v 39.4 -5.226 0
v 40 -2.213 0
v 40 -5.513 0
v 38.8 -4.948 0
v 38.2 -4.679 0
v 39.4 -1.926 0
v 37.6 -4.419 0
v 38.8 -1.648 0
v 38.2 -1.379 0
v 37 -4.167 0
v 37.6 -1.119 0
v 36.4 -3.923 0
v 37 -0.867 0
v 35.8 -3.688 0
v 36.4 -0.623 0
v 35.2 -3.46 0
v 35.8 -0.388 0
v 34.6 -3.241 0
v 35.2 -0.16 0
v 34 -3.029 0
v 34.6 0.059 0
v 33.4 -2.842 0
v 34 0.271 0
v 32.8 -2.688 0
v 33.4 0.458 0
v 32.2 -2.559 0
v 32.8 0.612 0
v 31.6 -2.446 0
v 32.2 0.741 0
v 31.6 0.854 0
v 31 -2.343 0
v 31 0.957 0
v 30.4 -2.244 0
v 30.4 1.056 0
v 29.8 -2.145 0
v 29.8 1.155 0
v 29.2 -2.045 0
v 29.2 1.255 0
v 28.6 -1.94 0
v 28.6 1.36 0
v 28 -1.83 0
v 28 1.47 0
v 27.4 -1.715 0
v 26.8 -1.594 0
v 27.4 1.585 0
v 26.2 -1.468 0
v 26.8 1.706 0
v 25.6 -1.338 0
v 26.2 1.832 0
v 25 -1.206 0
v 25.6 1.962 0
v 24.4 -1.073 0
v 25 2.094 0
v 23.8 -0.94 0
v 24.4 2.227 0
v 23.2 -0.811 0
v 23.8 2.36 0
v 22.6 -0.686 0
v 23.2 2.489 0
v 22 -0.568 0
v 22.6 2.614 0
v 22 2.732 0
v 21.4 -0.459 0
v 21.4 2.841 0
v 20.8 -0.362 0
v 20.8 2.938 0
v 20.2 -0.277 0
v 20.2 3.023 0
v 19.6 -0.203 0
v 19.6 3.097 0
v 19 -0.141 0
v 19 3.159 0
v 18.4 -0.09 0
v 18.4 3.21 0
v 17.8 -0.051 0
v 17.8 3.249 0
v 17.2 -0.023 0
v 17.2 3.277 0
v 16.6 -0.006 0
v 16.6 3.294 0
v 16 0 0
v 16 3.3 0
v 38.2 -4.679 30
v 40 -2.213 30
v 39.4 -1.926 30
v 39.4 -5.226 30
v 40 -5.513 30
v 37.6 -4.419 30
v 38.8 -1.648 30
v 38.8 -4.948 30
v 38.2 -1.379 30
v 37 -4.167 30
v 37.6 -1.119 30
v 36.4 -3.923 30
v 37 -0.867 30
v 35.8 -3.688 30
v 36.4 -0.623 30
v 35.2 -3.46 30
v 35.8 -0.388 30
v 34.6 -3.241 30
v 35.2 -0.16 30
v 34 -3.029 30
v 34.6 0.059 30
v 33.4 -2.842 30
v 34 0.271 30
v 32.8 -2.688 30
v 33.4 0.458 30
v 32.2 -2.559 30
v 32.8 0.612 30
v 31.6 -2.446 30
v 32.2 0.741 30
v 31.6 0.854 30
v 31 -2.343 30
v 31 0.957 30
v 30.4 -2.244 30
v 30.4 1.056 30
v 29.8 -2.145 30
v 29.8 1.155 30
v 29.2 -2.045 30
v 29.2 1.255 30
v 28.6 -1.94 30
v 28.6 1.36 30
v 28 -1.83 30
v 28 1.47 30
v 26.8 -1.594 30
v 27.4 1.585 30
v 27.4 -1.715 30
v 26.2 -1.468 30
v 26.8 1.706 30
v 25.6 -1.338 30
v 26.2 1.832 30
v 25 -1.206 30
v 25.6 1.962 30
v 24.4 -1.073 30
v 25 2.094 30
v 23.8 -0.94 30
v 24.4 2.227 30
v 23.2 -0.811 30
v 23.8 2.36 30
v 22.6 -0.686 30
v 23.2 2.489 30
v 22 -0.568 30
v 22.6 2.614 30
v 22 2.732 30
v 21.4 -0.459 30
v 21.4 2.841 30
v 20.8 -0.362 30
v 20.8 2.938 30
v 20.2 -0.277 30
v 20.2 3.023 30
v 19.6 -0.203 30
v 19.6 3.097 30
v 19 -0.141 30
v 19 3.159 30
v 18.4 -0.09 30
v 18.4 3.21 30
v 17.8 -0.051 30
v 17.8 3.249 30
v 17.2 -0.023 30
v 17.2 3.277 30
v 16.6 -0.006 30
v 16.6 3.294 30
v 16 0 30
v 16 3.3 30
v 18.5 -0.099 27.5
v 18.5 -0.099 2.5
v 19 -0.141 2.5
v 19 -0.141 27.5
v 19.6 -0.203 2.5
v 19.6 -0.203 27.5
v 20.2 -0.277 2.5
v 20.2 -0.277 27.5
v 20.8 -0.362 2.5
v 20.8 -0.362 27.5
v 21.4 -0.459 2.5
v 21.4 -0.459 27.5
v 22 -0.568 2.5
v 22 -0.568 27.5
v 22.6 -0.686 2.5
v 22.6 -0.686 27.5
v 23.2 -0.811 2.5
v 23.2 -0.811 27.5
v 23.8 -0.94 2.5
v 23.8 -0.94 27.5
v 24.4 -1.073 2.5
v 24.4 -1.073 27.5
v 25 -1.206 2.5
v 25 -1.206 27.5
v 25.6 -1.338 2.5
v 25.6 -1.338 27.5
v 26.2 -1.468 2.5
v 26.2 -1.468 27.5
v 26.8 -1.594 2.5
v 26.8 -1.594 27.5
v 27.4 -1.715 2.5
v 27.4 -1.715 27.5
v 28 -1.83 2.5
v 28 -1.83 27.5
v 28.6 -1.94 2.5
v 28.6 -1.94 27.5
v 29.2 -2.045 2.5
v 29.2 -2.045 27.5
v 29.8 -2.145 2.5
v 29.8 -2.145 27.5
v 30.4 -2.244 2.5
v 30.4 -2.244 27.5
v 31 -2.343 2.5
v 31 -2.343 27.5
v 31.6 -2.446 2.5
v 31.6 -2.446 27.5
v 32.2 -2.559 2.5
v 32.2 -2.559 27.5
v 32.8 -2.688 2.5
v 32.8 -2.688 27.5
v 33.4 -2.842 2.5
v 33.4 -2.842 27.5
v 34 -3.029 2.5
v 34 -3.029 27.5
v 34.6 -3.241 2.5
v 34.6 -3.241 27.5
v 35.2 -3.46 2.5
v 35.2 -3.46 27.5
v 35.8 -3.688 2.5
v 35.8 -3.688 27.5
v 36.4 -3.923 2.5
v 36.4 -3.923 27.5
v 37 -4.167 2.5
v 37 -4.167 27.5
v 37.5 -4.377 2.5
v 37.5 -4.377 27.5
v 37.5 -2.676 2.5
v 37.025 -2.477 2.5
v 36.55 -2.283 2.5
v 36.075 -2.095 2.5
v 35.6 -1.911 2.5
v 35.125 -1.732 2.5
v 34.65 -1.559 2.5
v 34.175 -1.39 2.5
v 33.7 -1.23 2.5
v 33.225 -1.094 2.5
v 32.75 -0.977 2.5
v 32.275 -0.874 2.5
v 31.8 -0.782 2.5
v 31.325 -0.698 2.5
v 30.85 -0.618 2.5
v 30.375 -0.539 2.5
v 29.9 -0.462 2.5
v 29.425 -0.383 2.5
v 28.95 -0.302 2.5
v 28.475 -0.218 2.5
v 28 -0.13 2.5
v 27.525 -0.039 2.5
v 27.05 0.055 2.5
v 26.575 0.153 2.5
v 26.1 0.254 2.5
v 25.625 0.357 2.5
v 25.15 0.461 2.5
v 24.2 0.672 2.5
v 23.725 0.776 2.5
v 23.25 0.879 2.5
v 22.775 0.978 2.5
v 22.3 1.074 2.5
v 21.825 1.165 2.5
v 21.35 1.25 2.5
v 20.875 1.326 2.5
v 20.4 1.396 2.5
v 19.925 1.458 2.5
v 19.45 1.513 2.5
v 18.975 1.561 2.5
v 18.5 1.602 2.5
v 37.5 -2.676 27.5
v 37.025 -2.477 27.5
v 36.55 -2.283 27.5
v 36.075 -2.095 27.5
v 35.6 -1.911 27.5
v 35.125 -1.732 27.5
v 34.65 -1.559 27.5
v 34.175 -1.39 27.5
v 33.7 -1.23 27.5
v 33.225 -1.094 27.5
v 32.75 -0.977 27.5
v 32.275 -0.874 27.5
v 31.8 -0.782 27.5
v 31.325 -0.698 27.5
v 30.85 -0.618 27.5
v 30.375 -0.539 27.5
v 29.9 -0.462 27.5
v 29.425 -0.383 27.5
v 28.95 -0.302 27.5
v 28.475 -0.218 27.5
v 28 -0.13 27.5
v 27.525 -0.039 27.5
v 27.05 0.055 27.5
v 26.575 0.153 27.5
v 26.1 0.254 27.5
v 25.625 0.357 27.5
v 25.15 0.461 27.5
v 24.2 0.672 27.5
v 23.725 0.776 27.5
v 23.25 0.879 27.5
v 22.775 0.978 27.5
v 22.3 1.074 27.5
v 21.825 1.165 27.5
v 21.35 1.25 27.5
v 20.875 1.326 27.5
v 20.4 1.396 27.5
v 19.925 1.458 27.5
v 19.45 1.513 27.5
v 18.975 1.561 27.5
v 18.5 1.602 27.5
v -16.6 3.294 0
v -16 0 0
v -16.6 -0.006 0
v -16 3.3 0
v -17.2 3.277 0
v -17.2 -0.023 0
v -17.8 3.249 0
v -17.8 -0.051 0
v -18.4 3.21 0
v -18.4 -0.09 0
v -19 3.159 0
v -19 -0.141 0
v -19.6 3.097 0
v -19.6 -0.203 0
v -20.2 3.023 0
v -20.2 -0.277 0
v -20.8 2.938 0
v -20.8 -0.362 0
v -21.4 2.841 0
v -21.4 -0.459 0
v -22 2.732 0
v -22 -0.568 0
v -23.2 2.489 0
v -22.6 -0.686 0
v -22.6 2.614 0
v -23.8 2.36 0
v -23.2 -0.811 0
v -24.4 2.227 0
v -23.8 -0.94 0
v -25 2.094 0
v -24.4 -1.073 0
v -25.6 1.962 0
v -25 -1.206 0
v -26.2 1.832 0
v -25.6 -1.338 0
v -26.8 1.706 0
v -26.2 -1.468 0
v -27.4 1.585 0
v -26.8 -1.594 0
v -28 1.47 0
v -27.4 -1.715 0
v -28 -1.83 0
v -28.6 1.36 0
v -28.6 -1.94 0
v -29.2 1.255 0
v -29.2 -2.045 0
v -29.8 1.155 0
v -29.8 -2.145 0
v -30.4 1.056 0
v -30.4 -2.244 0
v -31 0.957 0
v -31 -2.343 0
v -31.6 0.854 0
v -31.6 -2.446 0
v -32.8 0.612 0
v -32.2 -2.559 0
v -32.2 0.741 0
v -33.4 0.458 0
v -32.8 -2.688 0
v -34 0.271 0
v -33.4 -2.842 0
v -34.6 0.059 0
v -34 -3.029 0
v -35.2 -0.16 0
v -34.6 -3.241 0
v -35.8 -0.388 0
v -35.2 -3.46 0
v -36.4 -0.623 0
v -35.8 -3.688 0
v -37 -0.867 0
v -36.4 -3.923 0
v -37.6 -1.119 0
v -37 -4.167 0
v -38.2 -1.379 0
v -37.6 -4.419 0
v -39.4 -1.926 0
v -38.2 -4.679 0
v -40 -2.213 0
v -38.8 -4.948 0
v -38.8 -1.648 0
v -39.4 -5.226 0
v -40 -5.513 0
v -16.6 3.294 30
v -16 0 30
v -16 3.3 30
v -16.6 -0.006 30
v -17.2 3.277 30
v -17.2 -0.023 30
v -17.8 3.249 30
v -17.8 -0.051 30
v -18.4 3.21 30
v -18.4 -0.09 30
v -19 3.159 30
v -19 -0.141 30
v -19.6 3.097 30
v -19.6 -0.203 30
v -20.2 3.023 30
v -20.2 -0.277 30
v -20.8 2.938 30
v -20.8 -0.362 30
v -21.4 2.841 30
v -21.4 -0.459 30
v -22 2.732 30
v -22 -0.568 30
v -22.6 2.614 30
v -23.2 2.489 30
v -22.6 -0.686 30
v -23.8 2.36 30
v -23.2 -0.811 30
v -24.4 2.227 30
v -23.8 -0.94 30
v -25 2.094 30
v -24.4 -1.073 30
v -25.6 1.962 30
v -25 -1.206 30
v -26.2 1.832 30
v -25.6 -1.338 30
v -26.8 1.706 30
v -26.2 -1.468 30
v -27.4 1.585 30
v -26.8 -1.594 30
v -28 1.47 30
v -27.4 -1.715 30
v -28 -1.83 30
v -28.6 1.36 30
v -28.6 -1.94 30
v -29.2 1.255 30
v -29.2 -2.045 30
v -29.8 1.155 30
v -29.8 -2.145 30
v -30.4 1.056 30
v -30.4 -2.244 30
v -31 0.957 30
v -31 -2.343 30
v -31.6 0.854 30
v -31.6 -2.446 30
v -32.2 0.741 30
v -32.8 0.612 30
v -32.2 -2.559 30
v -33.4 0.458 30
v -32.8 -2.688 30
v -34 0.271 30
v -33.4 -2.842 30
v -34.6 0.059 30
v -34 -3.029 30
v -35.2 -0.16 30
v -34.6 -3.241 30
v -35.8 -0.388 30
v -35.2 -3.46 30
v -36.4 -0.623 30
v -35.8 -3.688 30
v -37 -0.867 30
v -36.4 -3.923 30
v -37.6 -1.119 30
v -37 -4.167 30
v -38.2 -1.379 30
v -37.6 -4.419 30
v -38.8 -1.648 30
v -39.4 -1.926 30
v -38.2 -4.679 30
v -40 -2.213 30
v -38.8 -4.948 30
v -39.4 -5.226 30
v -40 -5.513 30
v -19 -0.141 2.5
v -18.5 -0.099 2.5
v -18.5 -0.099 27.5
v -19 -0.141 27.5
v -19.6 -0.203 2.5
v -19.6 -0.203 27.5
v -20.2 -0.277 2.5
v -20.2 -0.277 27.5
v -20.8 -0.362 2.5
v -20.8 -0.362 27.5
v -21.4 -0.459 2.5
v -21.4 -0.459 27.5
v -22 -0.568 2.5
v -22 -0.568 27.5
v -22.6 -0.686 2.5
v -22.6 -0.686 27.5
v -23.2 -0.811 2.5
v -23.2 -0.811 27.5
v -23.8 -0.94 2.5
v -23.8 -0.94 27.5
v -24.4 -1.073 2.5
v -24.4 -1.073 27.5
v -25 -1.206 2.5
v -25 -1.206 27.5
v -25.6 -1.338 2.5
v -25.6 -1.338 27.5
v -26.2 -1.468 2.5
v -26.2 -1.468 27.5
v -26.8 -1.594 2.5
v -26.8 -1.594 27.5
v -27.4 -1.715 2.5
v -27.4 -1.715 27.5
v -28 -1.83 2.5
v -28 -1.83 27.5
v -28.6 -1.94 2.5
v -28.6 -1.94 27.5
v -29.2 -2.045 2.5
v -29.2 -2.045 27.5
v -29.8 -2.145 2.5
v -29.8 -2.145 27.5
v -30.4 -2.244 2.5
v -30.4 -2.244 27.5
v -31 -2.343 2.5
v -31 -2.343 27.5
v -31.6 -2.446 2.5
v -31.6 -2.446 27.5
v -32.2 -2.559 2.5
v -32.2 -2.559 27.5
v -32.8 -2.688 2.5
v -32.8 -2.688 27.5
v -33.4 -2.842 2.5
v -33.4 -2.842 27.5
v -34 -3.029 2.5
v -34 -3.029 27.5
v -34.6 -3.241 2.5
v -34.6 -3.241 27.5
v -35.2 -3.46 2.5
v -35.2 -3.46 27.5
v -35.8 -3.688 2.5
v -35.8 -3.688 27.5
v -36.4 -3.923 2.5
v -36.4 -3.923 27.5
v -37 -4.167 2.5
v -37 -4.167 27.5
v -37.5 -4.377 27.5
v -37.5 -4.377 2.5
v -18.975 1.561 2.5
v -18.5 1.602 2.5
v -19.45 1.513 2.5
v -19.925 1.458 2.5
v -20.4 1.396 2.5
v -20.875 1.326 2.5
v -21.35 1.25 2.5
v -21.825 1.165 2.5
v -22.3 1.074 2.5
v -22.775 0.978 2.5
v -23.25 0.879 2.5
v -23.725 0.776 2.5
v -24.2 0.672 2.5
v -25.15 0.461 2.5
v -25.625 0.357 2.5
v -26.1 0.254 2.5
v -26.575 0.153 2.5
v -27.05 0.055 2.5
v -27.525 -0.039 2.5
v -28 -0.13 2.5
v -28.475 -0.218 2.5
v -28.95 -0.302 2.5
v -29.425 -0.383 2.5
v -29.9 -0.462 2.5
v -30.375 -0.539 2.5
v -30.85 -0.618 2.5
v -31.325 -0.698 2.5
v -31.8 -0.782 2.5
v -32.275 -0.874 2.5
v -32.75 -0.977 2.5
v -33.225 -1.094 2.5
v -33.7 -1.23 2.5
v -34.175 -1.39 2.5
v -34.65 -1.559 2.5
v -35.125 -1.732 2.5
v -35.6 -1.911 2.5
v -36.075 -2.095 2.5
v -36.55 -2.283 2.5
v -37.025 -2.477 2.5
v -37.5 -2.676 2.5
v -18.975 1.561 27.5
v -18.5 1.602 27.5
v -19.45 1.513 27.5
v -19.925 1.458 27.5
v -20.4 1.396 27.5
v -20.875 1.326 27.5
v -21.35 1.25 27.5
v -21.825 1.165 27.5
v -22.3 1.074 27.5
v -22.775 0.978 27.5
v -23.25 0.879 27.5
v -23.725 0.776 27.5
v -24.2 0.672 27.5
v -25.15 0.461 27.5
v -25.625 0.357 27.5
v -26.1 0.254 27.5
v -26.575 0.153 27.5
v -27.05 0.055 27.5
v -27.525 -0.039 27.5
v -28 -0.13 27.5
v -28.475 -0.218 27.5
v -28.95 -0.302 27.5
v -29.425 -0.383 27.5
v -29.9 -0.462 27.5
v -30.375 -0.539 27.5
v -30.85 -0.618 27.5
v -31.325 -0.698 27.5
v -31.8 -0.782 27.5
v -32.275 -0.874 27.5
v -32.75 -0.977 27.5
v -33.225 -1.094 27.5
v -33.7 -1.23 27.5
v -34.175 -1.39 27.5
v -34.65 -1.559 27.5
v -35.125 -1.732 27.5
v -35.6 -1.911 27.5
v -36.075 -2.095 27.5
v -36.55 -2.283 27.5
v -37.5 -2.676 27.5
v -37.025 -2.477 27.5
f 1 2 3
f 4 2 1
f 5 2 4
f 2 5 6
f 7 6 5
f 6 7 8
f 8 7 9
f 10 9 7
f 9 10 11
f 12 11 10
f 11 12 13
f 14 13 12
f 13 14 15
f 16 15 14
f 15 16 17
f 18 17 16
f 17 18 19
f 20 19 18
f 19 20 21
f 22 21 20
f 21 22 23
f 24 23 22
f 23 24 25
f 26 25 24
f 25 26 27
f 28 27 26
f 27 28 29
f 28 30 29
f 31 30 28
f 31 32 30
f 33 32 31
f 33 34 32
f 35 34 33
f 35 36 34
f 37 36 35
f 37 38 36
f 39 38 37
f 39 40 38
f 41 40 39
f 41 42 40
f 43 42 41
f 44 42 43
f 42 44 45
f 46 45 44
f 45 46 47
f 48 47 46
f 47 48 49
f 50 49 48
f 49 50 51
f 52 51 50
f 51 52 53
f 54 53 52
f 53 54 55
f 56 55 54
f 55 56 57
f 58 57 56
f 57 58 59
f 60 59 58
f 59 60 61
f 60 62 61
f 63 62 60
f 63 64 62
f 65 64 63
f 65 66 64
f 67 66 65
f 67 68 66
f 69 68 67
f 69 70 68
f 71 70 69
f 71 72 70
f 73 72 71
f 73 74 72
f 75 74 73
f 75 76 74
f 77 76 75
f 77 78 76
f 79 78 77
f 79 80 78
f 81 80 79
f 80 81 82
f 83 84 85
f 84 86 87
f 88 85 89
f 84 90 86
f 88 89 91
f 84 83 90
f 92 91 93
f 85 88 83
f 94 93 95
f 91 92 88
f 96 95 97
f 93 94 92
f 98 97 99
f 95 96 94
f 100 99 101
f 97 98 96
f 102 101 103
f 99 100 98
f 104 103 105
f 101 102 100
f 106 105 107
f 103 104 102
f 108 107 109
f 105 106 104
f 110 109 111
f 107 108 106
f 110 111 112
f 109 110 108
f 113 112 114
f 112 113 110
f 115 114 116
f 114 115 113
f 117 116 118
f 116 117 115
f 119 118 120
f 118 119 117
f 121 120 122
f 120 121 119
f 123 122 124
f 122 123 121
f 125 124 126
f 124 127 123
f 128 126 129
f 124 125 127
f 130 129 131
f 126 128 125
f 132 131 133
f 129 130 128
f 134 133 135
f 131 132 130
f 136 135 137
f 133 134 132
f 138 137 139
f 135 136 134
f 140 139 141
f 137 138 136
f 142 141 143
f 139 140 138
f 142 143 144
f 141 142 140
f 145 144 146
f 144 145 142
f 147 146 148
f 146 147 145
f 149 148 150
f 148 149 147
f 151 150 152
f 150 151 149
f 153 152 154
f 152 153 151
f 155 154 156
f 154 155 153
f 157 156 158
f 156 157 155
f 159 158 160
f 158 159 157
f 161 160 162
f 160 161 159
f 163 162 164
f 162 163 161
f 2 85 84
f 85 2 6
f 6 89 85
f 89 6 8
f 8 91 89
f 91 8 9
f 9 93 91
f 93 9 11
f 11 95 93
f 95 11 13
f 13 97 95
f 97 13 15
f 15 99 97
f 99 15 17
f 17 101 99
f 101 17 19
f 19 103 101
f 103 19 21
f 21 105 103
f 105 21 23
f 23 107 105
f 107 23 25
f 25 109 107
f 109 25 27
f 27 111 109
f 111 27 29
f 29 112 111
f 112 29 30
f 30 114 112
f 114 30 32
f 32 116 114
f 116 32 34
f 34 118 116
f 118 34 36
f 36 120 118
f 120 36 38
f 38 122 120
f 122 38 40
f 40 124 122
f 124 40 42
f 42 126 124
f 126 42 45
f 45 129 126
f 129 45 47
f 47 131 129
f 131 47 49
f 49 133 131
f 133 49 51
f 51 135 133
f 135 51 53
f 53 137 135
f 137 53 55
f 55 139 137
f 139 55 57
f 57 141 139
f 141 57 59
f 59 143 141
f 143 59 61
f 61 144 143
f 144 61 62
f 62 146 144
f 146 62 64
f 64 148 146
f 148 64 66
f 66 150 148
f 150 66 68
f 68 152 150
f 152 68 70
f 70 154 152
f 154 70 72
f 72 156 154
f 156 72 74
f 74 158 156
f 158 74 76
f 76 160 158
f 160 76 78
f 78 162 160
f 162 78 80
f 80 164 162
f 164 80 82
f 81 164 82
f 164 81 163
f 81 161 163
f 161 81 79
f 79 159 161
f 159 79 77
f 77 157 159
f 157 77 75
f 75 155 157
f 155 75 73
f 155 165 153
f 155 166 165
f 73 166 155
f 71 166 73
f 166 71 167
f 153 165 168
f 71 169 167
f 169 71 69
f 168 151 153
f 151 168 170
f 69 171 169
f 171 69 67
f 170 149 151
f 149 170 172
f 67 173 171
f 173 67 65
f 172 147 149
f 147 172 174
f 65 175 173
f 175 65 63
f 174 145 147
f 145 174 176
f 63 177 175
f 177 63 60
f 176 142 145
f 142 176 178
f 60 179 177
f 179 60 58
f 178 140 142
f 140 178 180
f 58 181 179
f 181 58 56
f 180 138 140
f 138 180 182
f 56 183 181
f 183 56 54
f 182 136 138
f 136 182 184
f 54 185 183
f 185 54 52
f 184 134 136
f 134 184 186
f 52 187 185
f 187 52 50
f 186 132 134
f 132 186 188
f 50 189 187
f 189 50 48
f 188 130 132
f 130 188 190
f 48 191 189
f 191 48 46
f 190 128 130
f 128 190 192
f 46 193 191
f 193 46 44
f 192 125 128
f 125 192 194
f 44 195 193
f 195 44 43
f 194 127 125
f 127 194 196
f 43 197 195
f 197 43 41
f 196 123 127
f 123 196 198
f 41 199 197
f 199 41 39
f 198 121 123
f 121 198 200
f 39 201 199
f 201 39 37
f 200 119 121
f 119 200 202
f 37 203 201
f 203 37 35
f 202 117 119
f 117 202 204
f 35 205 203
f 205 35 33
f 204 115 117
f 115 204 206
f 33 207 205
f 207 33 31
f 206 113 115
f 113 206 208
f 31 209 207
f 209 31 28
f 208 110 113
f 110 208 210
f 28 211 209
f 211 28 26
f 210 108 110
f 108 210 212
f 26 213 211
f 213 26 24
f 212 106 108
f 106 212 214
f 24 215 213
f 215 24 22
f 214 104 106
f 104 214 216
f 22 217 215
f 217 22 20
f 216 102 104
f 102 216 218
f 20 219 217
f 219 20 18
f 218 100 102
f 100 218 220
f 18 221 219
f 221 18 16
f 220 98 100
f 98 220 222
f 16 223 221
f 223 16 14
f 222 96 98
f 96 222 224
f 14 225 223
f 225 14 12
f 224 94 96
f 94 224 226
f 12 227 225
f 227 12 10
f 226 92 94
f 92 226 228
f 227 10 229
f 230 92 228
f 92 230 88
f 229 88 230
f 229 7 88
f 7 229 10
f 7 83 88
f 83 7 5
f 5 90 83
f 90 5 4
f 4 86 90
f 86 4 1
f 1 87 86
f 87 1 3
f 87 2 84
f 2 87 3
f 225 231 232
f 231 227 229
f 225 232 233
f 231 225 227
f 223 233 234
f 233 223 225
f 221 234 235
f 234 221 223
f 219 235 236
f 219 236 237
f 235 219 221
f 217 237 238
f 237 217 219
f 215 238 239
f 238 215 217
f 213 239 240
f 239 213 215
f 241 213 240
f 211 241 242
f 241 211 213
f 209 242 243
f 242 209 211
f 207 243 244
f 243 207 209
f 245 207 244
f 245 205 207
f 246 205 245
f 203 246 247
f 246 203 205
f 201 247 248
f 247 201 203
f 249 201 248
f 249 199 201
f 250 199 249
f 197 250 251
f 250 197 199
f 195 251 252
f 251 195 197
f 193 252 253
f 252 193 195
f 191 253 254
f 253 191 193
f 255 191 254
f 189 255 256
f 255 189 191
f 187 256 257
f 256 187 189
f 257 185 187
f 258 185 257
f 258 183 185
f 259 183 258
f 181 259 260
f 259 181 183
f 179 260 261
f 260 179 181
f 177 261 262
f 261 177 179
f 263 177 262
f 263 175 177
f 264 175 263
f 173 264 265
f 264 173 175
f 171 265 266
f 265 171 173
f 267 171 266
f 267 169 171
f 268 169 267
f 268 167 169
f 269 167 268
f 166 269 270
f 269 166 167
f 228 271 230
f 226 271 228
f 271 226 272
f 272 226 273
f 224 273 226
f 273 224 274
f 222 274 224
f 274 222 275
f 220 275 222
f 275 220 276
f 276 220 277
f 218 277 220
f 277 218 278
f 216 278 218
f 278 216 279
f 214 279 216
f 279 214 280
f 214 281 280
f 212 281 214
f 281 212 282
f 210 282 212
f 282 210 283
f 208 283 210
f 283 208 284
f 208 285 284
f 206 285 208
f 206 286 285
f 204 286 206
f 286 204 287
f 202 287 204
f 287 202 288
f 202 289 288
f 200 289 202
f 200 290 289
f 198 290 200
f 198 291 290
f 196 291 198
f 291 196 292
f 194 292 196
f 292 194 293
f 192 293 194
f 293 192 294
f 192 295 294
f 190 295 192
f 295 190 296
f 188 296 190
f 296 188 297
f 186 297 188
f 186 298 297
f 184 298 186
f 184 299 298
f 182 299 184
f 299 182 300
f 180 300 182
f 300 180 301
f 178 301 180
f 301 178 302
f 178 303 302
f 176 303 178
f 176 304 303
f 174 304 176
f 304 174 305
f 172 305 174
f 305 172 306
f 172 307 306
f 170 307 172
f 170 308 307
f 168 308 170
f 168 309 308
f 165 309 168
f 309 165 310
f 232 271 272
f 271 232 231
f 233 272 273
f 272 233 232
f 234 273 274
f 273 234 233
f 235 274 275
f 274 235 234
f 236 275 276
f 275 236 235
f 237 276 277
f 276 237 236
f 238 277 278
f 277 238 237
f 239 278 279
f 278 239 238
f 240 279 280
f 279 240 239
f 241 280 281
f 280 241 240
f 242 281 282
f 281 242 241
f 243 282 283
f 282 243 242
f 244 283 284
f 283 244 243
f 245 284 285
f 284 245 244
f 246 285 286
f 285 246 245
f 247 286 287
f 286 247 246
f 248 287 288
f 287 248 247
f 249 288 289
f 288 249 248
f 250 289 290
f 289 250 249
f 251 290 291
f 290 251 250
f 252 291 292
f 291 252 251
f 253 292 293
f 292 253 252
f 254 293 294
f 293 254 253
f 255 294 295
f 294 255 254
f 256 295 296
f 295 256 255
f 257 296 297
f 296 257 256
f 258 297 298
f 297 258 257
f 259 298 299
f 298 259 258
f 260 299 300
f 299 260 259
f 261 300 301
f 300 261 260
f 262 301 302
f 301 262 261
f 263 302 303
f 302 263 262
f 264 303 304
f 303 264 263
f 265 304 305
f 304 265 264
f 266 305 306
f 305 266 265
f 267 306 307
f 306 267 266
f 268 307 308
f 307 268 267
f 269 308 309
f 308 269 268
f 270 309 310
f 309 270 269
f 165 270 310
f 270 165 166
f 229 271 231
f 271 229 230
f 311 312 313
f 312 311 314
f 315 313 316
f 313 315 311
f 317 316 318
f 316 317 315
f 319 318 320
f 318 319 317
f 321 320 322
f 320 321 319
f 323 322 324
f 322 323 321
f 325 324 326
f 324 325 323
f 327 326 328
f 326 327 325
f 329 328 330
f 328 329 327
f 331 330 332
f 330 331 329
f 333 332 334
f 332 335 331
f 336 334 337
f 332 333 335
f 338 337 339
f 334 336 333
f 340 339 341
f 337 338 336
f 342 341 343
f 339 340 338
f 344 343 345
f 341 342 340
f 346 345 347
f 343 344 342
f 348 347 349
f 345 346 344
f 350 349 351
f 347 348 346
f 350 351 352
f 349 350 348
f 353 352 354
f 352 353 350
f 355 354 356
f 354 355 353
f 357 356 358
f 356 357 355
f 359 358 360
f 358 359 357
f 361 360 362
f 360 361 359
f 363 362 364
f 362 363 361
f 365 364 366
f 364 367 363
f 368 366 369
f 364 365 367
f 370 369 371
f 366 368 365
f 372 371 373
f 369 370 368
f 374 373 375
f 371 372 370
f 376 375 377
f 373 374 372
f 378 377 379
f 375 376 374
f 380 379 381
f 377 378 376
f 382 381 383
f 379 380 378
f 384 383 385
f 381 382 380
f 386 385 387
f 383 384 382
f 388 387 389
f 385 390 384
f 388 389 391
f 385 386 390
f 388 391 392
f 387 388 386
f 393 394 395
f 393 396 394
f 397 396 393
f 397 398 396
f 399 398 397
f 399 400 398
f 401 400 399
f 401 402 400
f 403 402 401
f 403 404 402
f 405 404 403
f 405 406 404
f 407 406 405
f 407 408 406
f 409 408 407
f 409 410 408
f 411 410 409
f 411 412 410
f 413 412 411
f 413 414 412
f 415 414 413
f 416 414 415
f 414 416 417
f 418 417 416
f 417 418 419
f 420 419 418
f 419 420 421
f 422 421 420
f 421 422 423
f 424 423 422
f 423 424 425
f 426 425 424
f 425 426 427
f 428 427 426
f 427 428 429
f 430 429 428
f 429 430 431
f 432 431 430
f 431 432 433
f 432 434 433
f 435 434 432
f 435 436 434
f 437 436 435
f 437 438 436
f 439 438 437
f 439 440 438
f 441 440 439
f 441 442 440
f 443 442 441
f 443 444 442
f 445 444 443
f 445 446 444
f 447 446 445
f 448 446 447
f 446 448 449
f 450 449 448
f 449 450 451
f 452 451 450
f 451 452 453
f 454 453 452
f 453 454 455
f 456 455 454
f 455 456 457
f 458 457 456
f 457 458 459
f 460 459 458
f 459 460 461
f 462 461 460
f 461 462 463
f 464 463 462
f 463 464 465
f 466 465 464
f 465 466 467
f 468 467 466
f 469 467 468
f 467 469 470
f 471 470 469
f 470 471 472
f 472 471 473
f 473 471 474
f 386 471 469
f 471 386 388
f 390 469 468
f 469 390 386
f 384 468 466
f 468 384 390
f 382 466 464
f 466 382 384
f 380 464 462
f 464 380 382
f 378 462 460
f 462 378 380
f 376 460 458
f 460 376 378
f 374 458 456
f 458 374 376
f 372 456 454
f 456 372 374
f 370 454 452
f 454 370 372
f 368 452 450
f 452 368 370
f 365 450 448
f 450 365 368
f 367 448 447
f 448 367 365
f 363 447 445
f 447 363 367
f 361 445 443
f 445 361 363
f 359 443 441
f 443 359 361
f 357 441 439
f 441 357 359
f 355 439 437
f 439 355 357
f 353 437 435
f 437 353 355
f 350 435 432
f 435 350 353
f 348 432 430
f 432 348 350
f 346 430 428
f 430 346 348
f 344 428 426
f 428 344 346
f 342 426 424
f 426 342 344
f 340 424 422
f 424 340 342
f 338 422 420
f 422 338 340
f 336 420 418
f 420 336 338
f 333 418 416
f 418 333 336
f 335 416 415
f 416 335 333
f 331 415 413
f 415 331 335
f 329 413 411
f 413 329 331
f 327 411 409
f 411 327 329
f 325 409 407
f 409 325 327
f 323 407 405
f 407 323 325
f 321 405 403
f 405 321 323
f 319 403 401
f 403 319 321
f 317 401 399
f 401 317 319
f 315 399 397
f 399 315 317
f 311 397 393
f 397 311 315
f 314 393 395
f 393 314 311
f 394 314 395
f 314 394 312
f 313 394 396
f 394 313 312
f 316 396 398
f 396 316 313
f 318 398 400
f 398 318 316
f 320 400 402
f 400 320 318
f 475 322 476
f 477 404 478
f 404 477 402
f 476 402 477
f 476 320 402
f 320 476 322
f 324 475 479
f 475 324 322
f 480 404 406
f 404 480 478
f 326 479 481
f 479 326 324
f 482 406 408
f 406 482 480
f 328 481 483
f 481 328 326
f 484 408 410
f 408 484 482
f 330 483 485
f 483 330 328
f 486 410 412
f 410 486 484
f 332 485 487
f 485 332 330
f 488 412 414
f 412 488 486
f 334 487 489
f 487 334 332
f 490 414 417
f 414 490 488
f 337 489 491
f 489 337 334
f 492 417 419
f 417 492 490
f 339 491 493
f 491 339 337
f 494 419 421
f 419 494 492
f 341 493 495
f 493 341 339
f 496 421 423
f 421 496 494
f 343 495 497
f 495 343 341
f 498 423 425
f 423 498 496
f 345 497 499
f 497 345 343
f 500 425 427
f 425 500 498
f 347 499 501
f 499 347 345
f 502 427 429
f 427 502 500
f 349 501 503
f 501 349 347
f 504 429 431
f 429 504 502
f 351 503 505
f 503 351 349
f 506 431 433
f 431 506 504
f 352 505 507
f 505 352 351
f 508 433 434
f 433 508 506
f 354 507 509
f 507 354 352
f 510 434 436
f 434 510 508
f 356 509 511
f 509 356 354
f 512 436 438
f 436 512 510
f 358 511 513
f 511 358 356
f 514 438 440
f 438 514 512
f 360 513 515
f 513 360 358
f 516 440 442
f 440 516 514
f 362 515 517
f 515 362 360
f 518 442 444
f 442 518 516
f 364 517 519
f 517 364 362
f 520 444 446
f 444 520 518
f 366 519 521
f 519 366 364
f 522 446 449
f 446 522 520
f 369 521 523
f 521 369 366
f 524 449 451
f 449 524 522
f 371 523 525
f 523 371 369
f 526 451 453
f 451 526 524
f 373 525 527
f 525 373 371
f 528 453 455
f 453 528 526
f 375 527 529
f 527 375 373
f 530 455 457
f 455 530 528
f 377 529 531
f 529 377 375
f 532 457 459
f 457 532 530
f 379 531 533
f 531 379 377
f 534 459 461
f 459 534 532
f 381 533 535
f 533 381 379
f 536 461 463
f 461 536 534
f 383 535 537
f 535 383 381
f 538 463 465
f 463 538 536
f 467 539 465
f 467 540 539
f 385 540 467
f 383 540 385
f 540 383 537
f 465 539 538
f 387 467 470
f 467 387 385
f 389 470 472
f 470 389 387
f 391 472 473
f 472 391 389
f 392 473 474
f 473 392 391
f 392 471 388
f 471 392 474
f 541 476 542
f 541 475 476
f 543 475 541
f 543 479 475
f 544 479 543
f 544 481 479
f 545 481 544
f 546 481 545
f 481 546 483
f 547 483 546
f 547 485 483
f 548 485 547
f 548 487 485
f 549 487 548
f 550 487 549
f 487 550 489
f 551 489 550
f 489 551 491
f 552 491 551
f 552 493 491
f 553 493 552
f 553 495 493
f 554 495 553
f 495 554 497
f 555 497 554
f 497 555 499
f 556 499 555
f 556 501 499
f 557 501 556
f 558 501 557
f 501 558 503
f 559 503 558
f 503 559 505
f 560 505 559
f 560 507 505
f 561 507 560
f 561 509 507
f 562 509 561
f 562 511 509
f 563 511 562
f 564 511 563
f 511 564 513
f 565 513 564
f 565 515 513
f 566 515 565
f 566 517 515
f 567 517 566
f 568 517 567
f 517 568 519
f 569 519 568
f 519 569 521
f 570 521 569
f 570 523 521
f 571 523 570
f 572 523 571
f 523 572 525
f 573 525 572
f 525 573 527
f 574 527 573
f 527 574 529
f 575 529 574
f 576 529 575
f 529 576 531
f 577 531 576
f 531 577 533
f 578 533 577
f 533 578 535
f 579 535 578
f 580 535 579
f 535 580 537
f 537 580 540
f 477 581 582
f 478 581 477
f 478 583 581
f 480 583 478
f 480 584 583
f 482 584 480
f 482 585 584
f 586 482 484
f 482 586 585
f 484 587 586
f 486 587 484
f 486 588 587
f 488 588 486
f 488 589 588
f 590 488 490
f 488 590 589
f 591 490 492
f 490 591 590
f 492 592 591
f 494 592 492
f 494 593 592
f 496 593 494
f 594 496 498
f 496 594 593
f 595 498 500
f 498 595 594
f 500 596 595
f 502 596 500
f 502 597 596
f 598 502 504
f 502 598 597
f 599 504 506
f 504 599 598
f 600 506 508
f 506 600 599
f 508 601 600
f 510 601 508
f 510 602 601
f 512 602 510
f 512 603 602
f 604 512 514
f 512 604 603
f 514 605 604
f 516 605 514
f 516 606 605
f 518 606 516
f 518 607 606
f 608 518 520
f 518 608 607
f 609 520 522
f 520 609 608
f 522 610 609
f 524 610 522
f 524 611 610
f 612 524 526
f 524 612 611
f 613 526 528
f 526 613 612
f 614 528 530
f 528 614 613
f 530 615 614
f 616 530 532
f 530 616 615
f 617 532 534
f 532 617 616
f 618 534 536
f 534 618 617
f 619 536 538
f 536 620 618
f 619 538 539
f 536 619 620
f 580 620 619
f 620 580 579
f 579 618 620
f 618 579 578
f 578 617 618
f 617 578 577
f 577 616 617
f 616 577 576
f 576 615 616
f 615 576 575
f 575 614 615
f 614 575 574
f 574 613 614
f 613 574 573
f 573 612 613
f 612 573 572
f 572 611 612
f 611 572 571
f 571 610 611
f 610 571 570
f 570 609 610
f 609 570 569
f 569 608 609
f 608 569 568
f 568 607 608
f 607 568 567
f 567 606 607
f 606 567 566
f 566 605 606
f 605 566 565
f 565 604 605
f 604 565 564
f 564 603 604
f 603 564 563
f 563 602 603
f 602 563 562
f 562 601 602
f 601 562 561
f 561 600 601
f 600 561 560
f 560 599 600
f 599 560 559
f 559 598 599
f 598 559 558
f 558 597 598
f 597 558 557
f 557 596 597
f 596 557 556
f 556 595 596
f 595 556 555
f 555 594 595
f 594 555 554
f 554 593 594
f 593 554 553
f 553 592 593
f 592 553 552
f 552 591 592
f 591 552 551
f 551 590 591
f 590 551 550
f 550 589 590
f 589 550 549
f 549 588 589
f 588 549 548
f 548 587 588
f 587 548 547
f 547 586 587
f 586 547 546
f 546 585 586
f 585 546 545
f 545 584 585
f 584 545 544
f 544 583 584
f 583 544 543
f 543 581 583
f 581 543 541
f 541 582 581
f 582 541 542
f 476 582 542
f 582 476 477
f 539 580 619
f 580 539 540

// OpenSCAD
// file: wrist_mount_piece.scad
// ============================================================
// Wrist-conforming mount piece (independent of puck body)
// Sits on ONE side of the puck; print two, mirror for the other.
// The LRA window stays bare — this piece never covers it.
//
// Modeling axes (before you rotate for your own print orientation):
//   X = curve "run" from the puck-side edge (x=0) out to the
//       strap-side edge (x=mount_run)
//   Y = height/sag of the curve (this is the direction that
//       drops away from the puck as the piece follows the wrist)
//   Z = width along the wrist / strap direction (mount_length)
//
// Curve is a smooth blend of two circular arcs: tighter radius
// near the puck (r_inner), gentler radius near the strap edge
// (r_outer), blended over [blend_start, blend_end]. This is a
// single difference() between two well-conditioned (smooth,
// non-spiky) extruded solids -- not the multi-union pattern that
// broke CGAL on the cameo project, so no heightmap workaround
// should be needed here. Render-tested below.
// ============================================================

// ---------- PARAMETERS (mm) ----------------------------------
mount_run    = 24;   // curve profile length, puck-edge to strap-edge
mount_length = 30;   // width along the wrist (strap direction)

r_inner = 32;   // curvature radius near the puck edge (tighter)
r_outer = 55;   // curvature radius near the strap edge (gentler)
blend_start = 6;     // x where blend away from r_inner begins
blend_end   = 18;    // x where blend to r_outer completes

back_thickness = 1.6;   // solid backing thickness above the pocket floor (structural)
rim_width      = 2.5;   // solid rim border around the foam pocket (all sides)

foam_thickness = 2.0;   // target foam pad thickness (adjust once you've picked stock)
foam_proud     = 0.3;   // how far the foam should sit proud of the rim at rest
pocket_depth   = foam_thickness - foam_proud;  // recess cut UP from the rim plane for the foam

seg = 40;   // profile sample resolution
$fn = 60;

// ---------- CURVE MATH ----------------------------------------
function sag(x, r) = r - sqrt(max(r*r - x*x, 0));

function smoothstep(x, a, b) =
    let(t = min(max((x - a) / (b - a), 0), 1))
    t * t * (3 - 2 * t);

function sag_blend(x) =
    let(w = smoothstep(x, blend_start, blend_end))
    sag(x, r_inner) * (1 - w) + sag(x, r_outer) * w;

// skin-facing (bottom / rim) curve -- dips down (negative) as x grows
function z_bottom(x) = -sag_blend(x);
// pocket floor: recessed UP from the rim plane by pocket_depth
function z_floor(x) = z_bottom(x) + pocket_depth;
// outer back surface, above the floor by the structural backing
function shell_top_z(x) = z_floor(x) + back_thickness;

// ---------- 2D PROFILES -----------------------------------------
module shell_profile() {
    bottom_pts = [ for (i = [0:seg]) let(x = mount_run * i / seg) [x, z_bottom(x)] ];
    top_pts    = [ for (i = [seg:-1:0]) let(x = mount_run * i / seg) [x, shell_top_z(x)] ];
    polygon(concat(bottom_pts, top_pts));
}

// Cuts the pocket from the skin-facing (bottom) side up to the
// floor -- inset by rim_width in x so a solid rim survives all
// the way around. The -1 undercut guarantees the cut breaks
// cleanly through the bottom face rather than leaving a skin.
module pocket_profile() {
    x0 = rim_width;
    x1 = mount_run - rim_width;
    bottom_pts = [ for (i = [0:seg]) let(x = x0 + (x1 - x0) * i / seg) [x, z_bottom(x) - 1] ];
    top_pts    = [ for (i = [seg:-1:0]) let(x = x0 + (x1 - x0) * i / seg) [x, z_floor(x)] ];
    polygon(concat(bottom_pts, top_pts));
}

// ---------- 3D PIECE ---------------------------------------------
module mount_piece() {
    difference() {
        linear_extrude(height = mount_length)
            shell_profile();
        translate([0, 0, rim_width])
            linear_extrude(height = mount_length - 2 * rim_width)
                pocket_profile();
    }
}

mount_piece();

// For the mirrored (opposite-side) piece:
// mirror([1, 0, 0]) mount_piece();
// main file
use <wrist_mount_piece.scad>

// Rough visual check only -- axis alignment against a real puck
// model isn't attempted here, just spacing the two mirrored
// pieces apart by a placeholder puck width.
puck_width = 32;

translate([puck_width/2, 0, 0])
    color("steelblue")
    mount_piece();

translate([-puck_width/2, 0, 0])
    color("steelblue")
    mirror([1, 0, 0])
        mount_piece();
